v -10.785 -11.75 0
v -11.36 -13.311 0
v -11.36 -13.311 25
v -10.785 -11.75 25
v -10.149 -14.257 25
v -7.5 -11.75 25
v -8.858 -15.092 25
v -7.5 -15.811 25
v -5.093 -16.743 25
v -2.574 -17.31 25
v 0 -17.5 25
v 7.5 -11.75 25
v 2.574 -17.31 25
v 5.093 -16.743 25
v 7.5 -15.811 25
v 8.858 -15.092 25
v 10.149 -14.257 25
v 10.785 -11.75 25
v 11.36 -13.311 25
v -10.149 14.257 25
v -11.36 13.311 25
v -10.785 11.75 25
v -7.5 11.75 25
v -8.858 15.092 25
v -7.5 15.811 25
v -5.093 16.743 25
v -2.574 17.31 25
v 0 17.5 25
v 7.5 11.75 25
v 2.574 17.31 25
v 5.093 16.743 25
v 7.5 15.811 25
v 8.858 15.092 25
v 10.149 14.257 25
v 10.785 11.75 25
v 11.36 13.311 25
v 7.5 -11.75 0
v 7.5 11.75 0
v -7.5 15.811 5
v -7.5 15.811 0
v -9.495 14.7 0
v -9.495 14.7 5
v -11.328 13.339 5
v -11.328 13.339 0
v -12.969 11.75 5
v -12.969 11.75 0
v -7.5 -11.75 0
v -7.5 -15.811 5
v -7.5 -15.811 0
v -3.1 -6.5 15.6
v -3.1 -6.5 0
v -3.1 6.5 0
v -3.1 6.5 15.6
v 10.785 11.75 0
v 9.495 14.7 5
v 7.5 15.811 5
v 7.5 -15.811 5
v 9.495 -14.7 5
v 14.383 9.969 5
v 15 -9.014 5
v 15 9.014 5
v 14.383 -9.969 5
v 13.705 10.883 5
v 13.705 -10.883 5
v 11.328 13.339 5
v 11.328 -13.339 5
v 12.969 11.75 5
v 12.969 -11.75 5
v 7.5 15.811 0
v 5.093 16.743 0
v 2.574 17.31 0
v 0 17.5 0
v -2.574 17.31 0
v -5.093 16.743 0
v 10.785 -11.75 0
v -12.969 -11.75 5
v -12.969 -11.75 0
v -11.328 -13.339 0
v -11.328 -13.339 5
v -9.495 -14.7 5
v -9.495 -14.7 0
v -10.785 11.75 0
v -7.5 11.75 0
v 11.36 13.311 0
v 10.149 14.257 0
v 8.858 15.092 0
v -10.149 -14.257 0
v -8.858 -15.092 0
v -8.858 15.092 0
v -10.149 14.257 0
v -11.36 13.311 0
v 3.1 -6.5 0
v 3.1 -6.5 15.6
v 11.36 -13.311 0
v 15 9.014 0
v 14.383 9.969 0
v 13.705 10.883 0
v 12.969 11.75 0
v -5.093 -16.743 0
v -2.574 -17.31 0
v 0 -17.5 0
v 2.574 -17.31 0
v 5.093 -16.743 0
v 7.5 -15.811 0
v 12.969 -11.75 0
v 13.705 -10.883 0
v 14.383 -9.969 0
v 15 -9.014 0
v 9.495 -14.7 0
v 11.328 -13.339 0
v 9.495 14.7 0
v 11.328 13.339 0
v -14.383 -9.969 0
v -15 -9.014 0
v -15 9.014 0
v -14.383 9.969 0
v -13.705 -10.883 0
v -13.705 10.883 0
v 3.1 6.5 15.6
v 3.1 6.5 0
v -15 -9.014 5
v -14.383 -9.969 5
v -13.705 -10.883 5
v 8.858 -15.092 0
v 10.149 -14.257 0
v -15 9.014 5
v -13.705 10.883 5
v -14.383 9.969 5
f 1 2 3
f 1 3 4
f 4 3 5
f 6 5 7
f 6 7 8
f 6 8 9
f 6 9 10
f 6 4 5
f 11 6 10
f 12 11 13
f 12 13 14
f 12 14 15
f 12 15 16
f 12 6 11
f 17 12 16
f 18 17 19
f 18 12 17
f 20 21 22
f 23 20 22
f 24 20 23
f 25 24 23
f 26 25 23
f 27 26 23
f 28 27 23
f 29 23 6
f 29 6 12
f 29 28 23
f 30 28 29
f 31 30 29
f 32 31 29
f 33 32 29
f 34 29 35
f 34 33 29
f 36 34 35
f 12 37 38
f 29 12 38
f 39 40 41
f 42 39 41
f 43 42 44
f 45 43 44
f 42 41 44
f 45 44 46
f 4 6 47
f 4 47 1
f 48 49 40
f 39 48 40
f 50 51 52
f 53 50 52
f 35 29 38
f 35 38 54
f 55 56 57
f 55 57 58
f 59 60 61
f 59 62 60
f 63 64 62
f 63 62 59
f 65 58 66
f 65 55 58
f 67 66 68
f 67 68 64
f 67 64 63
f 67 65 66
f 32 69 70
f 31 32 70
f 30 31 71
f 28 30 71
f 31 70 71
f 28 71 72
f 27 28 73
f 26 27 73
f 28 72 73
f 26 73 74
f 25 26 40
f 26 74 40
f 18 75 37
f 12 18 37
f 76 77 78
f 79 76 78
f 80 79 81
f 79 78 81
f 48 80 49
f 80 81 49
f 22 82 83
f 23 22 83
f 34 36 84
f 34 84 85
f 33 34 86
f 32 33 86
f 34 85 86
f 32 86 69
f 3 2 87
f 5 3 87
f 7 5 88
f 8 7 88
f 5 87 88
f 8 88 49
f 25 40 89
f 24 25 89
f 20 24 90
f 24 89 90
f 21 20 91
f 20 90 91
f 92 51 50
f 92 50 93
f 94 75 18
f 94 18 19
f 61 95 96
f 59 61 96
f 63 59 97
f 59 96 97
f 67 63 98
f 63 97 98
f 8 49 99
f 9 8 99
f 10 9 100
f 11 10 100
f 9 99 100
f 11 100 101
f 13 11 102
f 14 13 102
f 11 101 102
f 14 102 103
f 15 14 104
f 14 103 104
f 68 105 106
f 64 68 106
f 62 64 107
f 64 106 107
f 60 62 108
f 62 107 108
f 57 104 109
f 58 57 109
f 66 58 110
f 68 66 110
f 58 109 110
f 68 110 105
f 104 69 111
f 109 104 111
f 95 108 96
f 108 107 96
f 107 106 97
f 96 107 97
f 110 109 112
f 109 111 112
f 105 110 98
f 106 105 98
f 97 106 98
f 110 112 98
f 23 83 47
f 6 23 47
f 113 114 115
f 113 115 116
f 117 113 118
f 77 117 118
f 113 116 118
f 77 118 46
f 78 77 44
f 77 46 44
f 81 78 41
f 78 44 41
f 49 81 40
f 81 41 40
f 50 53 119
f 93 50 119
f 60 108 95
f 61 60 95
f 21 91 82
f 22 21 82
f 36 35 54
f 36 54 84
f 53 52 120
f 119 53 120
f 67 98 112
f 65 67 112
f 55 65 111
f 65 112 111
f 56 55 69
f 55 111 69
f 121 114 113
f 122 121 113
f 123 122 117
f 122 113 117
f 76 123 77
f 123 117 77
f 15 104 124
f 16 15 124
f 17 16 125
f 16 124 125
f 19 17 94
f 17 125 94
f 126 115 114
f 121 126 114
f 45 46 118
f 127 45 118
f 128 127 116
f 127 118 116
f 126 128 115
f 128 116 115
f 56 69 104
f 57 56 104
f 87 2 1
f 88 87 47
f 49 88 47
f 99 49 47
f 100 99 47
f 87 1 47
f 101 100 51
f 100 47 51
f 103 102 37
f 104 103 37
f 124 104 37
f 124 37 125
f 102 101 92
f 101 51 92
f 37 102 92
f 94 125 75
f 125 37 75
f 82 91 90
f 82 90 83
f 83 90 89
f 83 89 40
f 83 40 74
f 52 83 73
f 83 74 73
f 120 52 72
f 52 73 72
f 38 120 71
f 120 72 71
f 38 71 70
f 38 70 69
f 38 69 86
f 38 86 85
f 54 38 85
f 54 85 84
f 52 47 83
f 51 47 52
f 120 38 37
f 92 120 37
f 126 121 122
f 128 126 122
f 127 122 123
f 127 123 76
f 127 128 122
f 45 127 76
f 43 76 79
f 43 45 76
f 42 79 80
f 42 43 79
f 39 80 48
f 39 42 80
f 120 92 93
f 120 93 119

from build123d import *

# Parameters (mm, degrees)
F1_DEPTH    = 5
F0_W        = 15
F0_H        = 23.5
F0_W_2      = 6.2
F0_H_2      = 13
F2_DEPTH    = 25
F3_DEPTH    = 15.6
F4_T1_DEPTH = 36.3750267574


# Not quite as in the source:
# - a fillet or chamfer that OpenCascade refuses, or shapes differently, is made with other operations: its cross-section is extruded or revolved along the edge and cut away or added
# - a feature names something its author has since deleted; it is built from what else it names


with BuildPart() as f1:
    # F0 (on Top) → F1 (new body)
    with BuildSketch(Plane.XY):
        with BuildLine():
            Line((15, -9.0138781887), (15, 9.0138781887))
            ThreePointArc((15, 9.0138781887), (14.0511141288, 10.4314999755), (12.9687123493, 11.75))
            Line((12.9687123493, 11.75), (7.5, 11.75))
            Line((7.5, 11.75), (7.5, -11.75))
            Line((7.5, -11.75), (12.9687123493, -11.75))
            ThreePointArc((12.9687123493, -11.75), (14.0511141288, -10.4314999755), (15, -9.0138781887))
        make_face()
        with BuildLine():
            ThreePointArc((7.5, -15.8113883008), (10.4338758399, -14.0493499834), (12.9687123493, -11.75))
            Line((12.9687123493, -11.75), (7.5, -11.75))
            Line((7.5, -11.75), (7.5, -15.8113883008))
        make_face()
        with BuildLine():
            Line((7.5, 11.75), (12.9687123493, 11.75))
            ThreePointArc((12.9687123493, 11.75), (10.4338758399, 14.0493499834), (7.5, 15.8113883008))
            Line((7.5, 15.8113883008), (7.5, 11.75))
        make_face()
    extrude(amount=F1_DEPTH)


with BuildPart() as f1b:
    # F0 (on Top) → F1, piece 2 (new body)
    with BuildSketch(Plane.XY):
        with BuildLine():
            Line((-7.5, -11.75), (-7.5, 11.75))
            Line((-7.5, 11.75), (-12.9687123493, 11.75))
            ThreePointArc((-12.9687123493, 11.75), (-14.0511141288, 10.4314999755), (-15, 9.0138781887))
            Line((-15, 9.0138781887), (-15, -9.0138781887))
            ThreePointArc((-15, -9.0138781887), (-14.0511141288, -10.4314999755), (-12.9687123493, -11.75))
            Line((-12.9687123493, -11.75), (-7.5, -11.75))
        make_face()
        with BuildLine():
            Line((-7.5, 11.75), (-7.5, 15.8113883008))
            ThreePointArc((-7.5, 15.8113883008), (-10.4338758399, 14.0493499834), (-12.9687123493, 11.75))
            Line((-12.9687123493, 11.75), (-7.5, 11.75))
        make_face()
        with BuildLine():
            ThreePointArc((-12.9687123493, -11.75), (-10.4338758399, -14.0493499834), (-7.5, -15.8113883008))
            Line((-7.5, -15.8113883008), (-7.5, -11.75))
            Line((-7.5, -11.75), (-12.9687123493, -11.75))
        make_face()
    extrude(amount=F1_DEPTH)


with BuildPart() as f2:
    # F0 (on Top) → F2 (new body)
    with BuildSketch(Plane.XY):
        Rectangle(F0_W, F0_H)
        Rectangle(F0_W_2, F0_H_2, mode=Mode.SUBTRACT)
        Rectangle(F0_W_2, F0_H_2)
        with BuildLine():
            Line((7.5, 11.75), (7.5, 15.8113883008))
            ThreePointArc((7.5, 15.8113883008), (0, 17.5), (-7.5, 15.8113883008))
            Line((-7.5, 15.8113883008), (-7.5, 11.75))
            Line((-7.5, 11.75), (7.5, 11.75))
        make_face()
        with BuildLine():
            ThreePointArc((-7.5, -15.8113883008), (0, -17.5), (7.5, -15.8113883008))
            Line((7.5, -15.8113883008), (7.5, -11.75))
            Line((7.5, -11.75), (-7.5, -11.75))
            Line((-7.5, -11.75), (-7.5, -15.8113883008))
        make_face()
        with BuildLine():
            ThreePointArc((-12.9687123493, -11.75), (-10.4338758399, -14.0493499834), (-7.5, -15.8113883008))
            Line((-7.5, -15.8113883008), (-7.5, -11.75))
            Line((-7.5, -11.75), (-12.9687123493, -11.75))
        make_face()
        with BuildLine():
            Line((-7.5, 11.75), (-7.5, 15.8113883008))
            ThreePointArc((-7.5, 15.8113883008), (-10.4338758399, 14.0493499834), (-12.9687123493, 11.75))
            Line((-12.9687123493, 11.75), (-7.5, 11.75))
        make_face()
        with BuildLine():
            Line((7.5, 11.75), (12.9687123493, 11.75))
            ThreePointArc((12.9687123493, 11.75), (10.4338758399, 14.0493499834), (7.5, 15.8113883008))
            Line((7.5, 15.8113883008), (7.5, 11.75))
        make_face()
        with BuildLine():
            ThreePointArc((7.5, -15.8113883008), (10.4338758399, -14.0493499834), (12.9687123493, -11.75))
            Line((12.9687123493, -11.75), (7.5, -11.75))
            Line((7.5, -11.75), (7.5, -15.8113883008))
        make_face()
    extrude(amount=F2_DEPTH)

    # F0 (on Top) → F3 (cut)
    with BuildSketch(Plane.XY):
        Rectangle(F0_W_2, F0_H_2)
    extrude(amount=F3_DEPTH, mode=Mode.SUBTRACT)

    # F4: chamfer of 2 on 4 edges, made by hand

    # F4_s2 → F4_t1 (cut)
    with BuildSketch(Plane.XY.offset(-5.6875133787)):
        with BuildLine():
            Line((-11.3881617362, -13.3863096005), (-10.7571586121, -11.6749396443))
            Line((-10.7571586121, -11.6749396443), (-10.7571586121, -11.6349396443))
            ThreePointArc((-10.7571586121, -11.6349396443), (-11.8629354807, -11.71), (-12.9687123493, -11.71))
            Line((-12.9687123493, -11.71), (-12.9983551204, -11.7768571429))
            ThreePointArc((-12.9983551204, -11.7768571429), (-12.2058182488, -12.5964122224), (-11.4141285615, -13.4167353131))
            Line((-11.4141285615, -13.4167353131), (-11.3881617362, -13.3863096005))
        make_face()
        with BuildLine():
            Line((10.7571586121, -11.6749396443), (11.3881617362, -13.3863096005))
            Line((11.3881617362, -13.3863096005), (11.4141285615, -13.4167353131))
            ThreePointArc((11.4141285615, -13.4167353131), (12.2058182488, -12.5964122224), (12.9983551204, -11.7768571429))
            Line((12.9983551204, -11.7768571429), (12.9687123493, -11.71))
            ThreePointArc((12.9687123493, -11.71), (11.8629354807, -11.71), (10.7571586121, -11.6349396443))
            Line((10.7571586121, -11.6349396443), (10.7571586121, -11.6749396443))
        make_face()
        with BuildLine():
            Line((10.7571586121, 11.6749396443), (11.3881617362, 13.3863096005))
            Line((11.3881617362, 13.3863096005), (11.4141285615, 13.4167353131))
            ThreePointArc((11.4141285615, 13.4167353131), (12.2058182488, 12.5964122224), (12.9983551204, 11.7768571429))
            Line((12.9983551204, 11.7768571429), (12.9687123493, 11.71))
            ThreePointArc((12.9687123493, 11.71), (11.8629354807, 11.71), (10.7571586121, 11.6349396443))
            Line((10.7571586121, 11.6349396443), (10.7571586121, 11.6749396443))
        make_face()
        with BuildLine():
            Line((-11.3881617362, 13.3863096005), (-10.7571586121, 11.6749396443))
            Line((-10.7571586121, 11.6749396443), (-10.7571586121, 11.6349396443))
            ThreePointArc((-10.7571586121, 11.6349396443), (-11.8629354807, 11.71), (-12.9687123493, 11.71))
            Line((-12.9687123493, 11.71), (-12.9983551204, 11.7768571429))
            ThreePointArc((-12.9983551204, 11.7768571429), (-12.2058182488, 12.5964122224), (-11.4141285615, 13.4167353131))
            Line((-11.4141285615, 13.4167353131), (-11.3881617362, 13.3863096005))
        make_face()
    extrude(amount=F4_T1_DEPTH, mode=Mode.SUBTRACT)


solid = Compound([f1.part, f1b.part, f2.part])
